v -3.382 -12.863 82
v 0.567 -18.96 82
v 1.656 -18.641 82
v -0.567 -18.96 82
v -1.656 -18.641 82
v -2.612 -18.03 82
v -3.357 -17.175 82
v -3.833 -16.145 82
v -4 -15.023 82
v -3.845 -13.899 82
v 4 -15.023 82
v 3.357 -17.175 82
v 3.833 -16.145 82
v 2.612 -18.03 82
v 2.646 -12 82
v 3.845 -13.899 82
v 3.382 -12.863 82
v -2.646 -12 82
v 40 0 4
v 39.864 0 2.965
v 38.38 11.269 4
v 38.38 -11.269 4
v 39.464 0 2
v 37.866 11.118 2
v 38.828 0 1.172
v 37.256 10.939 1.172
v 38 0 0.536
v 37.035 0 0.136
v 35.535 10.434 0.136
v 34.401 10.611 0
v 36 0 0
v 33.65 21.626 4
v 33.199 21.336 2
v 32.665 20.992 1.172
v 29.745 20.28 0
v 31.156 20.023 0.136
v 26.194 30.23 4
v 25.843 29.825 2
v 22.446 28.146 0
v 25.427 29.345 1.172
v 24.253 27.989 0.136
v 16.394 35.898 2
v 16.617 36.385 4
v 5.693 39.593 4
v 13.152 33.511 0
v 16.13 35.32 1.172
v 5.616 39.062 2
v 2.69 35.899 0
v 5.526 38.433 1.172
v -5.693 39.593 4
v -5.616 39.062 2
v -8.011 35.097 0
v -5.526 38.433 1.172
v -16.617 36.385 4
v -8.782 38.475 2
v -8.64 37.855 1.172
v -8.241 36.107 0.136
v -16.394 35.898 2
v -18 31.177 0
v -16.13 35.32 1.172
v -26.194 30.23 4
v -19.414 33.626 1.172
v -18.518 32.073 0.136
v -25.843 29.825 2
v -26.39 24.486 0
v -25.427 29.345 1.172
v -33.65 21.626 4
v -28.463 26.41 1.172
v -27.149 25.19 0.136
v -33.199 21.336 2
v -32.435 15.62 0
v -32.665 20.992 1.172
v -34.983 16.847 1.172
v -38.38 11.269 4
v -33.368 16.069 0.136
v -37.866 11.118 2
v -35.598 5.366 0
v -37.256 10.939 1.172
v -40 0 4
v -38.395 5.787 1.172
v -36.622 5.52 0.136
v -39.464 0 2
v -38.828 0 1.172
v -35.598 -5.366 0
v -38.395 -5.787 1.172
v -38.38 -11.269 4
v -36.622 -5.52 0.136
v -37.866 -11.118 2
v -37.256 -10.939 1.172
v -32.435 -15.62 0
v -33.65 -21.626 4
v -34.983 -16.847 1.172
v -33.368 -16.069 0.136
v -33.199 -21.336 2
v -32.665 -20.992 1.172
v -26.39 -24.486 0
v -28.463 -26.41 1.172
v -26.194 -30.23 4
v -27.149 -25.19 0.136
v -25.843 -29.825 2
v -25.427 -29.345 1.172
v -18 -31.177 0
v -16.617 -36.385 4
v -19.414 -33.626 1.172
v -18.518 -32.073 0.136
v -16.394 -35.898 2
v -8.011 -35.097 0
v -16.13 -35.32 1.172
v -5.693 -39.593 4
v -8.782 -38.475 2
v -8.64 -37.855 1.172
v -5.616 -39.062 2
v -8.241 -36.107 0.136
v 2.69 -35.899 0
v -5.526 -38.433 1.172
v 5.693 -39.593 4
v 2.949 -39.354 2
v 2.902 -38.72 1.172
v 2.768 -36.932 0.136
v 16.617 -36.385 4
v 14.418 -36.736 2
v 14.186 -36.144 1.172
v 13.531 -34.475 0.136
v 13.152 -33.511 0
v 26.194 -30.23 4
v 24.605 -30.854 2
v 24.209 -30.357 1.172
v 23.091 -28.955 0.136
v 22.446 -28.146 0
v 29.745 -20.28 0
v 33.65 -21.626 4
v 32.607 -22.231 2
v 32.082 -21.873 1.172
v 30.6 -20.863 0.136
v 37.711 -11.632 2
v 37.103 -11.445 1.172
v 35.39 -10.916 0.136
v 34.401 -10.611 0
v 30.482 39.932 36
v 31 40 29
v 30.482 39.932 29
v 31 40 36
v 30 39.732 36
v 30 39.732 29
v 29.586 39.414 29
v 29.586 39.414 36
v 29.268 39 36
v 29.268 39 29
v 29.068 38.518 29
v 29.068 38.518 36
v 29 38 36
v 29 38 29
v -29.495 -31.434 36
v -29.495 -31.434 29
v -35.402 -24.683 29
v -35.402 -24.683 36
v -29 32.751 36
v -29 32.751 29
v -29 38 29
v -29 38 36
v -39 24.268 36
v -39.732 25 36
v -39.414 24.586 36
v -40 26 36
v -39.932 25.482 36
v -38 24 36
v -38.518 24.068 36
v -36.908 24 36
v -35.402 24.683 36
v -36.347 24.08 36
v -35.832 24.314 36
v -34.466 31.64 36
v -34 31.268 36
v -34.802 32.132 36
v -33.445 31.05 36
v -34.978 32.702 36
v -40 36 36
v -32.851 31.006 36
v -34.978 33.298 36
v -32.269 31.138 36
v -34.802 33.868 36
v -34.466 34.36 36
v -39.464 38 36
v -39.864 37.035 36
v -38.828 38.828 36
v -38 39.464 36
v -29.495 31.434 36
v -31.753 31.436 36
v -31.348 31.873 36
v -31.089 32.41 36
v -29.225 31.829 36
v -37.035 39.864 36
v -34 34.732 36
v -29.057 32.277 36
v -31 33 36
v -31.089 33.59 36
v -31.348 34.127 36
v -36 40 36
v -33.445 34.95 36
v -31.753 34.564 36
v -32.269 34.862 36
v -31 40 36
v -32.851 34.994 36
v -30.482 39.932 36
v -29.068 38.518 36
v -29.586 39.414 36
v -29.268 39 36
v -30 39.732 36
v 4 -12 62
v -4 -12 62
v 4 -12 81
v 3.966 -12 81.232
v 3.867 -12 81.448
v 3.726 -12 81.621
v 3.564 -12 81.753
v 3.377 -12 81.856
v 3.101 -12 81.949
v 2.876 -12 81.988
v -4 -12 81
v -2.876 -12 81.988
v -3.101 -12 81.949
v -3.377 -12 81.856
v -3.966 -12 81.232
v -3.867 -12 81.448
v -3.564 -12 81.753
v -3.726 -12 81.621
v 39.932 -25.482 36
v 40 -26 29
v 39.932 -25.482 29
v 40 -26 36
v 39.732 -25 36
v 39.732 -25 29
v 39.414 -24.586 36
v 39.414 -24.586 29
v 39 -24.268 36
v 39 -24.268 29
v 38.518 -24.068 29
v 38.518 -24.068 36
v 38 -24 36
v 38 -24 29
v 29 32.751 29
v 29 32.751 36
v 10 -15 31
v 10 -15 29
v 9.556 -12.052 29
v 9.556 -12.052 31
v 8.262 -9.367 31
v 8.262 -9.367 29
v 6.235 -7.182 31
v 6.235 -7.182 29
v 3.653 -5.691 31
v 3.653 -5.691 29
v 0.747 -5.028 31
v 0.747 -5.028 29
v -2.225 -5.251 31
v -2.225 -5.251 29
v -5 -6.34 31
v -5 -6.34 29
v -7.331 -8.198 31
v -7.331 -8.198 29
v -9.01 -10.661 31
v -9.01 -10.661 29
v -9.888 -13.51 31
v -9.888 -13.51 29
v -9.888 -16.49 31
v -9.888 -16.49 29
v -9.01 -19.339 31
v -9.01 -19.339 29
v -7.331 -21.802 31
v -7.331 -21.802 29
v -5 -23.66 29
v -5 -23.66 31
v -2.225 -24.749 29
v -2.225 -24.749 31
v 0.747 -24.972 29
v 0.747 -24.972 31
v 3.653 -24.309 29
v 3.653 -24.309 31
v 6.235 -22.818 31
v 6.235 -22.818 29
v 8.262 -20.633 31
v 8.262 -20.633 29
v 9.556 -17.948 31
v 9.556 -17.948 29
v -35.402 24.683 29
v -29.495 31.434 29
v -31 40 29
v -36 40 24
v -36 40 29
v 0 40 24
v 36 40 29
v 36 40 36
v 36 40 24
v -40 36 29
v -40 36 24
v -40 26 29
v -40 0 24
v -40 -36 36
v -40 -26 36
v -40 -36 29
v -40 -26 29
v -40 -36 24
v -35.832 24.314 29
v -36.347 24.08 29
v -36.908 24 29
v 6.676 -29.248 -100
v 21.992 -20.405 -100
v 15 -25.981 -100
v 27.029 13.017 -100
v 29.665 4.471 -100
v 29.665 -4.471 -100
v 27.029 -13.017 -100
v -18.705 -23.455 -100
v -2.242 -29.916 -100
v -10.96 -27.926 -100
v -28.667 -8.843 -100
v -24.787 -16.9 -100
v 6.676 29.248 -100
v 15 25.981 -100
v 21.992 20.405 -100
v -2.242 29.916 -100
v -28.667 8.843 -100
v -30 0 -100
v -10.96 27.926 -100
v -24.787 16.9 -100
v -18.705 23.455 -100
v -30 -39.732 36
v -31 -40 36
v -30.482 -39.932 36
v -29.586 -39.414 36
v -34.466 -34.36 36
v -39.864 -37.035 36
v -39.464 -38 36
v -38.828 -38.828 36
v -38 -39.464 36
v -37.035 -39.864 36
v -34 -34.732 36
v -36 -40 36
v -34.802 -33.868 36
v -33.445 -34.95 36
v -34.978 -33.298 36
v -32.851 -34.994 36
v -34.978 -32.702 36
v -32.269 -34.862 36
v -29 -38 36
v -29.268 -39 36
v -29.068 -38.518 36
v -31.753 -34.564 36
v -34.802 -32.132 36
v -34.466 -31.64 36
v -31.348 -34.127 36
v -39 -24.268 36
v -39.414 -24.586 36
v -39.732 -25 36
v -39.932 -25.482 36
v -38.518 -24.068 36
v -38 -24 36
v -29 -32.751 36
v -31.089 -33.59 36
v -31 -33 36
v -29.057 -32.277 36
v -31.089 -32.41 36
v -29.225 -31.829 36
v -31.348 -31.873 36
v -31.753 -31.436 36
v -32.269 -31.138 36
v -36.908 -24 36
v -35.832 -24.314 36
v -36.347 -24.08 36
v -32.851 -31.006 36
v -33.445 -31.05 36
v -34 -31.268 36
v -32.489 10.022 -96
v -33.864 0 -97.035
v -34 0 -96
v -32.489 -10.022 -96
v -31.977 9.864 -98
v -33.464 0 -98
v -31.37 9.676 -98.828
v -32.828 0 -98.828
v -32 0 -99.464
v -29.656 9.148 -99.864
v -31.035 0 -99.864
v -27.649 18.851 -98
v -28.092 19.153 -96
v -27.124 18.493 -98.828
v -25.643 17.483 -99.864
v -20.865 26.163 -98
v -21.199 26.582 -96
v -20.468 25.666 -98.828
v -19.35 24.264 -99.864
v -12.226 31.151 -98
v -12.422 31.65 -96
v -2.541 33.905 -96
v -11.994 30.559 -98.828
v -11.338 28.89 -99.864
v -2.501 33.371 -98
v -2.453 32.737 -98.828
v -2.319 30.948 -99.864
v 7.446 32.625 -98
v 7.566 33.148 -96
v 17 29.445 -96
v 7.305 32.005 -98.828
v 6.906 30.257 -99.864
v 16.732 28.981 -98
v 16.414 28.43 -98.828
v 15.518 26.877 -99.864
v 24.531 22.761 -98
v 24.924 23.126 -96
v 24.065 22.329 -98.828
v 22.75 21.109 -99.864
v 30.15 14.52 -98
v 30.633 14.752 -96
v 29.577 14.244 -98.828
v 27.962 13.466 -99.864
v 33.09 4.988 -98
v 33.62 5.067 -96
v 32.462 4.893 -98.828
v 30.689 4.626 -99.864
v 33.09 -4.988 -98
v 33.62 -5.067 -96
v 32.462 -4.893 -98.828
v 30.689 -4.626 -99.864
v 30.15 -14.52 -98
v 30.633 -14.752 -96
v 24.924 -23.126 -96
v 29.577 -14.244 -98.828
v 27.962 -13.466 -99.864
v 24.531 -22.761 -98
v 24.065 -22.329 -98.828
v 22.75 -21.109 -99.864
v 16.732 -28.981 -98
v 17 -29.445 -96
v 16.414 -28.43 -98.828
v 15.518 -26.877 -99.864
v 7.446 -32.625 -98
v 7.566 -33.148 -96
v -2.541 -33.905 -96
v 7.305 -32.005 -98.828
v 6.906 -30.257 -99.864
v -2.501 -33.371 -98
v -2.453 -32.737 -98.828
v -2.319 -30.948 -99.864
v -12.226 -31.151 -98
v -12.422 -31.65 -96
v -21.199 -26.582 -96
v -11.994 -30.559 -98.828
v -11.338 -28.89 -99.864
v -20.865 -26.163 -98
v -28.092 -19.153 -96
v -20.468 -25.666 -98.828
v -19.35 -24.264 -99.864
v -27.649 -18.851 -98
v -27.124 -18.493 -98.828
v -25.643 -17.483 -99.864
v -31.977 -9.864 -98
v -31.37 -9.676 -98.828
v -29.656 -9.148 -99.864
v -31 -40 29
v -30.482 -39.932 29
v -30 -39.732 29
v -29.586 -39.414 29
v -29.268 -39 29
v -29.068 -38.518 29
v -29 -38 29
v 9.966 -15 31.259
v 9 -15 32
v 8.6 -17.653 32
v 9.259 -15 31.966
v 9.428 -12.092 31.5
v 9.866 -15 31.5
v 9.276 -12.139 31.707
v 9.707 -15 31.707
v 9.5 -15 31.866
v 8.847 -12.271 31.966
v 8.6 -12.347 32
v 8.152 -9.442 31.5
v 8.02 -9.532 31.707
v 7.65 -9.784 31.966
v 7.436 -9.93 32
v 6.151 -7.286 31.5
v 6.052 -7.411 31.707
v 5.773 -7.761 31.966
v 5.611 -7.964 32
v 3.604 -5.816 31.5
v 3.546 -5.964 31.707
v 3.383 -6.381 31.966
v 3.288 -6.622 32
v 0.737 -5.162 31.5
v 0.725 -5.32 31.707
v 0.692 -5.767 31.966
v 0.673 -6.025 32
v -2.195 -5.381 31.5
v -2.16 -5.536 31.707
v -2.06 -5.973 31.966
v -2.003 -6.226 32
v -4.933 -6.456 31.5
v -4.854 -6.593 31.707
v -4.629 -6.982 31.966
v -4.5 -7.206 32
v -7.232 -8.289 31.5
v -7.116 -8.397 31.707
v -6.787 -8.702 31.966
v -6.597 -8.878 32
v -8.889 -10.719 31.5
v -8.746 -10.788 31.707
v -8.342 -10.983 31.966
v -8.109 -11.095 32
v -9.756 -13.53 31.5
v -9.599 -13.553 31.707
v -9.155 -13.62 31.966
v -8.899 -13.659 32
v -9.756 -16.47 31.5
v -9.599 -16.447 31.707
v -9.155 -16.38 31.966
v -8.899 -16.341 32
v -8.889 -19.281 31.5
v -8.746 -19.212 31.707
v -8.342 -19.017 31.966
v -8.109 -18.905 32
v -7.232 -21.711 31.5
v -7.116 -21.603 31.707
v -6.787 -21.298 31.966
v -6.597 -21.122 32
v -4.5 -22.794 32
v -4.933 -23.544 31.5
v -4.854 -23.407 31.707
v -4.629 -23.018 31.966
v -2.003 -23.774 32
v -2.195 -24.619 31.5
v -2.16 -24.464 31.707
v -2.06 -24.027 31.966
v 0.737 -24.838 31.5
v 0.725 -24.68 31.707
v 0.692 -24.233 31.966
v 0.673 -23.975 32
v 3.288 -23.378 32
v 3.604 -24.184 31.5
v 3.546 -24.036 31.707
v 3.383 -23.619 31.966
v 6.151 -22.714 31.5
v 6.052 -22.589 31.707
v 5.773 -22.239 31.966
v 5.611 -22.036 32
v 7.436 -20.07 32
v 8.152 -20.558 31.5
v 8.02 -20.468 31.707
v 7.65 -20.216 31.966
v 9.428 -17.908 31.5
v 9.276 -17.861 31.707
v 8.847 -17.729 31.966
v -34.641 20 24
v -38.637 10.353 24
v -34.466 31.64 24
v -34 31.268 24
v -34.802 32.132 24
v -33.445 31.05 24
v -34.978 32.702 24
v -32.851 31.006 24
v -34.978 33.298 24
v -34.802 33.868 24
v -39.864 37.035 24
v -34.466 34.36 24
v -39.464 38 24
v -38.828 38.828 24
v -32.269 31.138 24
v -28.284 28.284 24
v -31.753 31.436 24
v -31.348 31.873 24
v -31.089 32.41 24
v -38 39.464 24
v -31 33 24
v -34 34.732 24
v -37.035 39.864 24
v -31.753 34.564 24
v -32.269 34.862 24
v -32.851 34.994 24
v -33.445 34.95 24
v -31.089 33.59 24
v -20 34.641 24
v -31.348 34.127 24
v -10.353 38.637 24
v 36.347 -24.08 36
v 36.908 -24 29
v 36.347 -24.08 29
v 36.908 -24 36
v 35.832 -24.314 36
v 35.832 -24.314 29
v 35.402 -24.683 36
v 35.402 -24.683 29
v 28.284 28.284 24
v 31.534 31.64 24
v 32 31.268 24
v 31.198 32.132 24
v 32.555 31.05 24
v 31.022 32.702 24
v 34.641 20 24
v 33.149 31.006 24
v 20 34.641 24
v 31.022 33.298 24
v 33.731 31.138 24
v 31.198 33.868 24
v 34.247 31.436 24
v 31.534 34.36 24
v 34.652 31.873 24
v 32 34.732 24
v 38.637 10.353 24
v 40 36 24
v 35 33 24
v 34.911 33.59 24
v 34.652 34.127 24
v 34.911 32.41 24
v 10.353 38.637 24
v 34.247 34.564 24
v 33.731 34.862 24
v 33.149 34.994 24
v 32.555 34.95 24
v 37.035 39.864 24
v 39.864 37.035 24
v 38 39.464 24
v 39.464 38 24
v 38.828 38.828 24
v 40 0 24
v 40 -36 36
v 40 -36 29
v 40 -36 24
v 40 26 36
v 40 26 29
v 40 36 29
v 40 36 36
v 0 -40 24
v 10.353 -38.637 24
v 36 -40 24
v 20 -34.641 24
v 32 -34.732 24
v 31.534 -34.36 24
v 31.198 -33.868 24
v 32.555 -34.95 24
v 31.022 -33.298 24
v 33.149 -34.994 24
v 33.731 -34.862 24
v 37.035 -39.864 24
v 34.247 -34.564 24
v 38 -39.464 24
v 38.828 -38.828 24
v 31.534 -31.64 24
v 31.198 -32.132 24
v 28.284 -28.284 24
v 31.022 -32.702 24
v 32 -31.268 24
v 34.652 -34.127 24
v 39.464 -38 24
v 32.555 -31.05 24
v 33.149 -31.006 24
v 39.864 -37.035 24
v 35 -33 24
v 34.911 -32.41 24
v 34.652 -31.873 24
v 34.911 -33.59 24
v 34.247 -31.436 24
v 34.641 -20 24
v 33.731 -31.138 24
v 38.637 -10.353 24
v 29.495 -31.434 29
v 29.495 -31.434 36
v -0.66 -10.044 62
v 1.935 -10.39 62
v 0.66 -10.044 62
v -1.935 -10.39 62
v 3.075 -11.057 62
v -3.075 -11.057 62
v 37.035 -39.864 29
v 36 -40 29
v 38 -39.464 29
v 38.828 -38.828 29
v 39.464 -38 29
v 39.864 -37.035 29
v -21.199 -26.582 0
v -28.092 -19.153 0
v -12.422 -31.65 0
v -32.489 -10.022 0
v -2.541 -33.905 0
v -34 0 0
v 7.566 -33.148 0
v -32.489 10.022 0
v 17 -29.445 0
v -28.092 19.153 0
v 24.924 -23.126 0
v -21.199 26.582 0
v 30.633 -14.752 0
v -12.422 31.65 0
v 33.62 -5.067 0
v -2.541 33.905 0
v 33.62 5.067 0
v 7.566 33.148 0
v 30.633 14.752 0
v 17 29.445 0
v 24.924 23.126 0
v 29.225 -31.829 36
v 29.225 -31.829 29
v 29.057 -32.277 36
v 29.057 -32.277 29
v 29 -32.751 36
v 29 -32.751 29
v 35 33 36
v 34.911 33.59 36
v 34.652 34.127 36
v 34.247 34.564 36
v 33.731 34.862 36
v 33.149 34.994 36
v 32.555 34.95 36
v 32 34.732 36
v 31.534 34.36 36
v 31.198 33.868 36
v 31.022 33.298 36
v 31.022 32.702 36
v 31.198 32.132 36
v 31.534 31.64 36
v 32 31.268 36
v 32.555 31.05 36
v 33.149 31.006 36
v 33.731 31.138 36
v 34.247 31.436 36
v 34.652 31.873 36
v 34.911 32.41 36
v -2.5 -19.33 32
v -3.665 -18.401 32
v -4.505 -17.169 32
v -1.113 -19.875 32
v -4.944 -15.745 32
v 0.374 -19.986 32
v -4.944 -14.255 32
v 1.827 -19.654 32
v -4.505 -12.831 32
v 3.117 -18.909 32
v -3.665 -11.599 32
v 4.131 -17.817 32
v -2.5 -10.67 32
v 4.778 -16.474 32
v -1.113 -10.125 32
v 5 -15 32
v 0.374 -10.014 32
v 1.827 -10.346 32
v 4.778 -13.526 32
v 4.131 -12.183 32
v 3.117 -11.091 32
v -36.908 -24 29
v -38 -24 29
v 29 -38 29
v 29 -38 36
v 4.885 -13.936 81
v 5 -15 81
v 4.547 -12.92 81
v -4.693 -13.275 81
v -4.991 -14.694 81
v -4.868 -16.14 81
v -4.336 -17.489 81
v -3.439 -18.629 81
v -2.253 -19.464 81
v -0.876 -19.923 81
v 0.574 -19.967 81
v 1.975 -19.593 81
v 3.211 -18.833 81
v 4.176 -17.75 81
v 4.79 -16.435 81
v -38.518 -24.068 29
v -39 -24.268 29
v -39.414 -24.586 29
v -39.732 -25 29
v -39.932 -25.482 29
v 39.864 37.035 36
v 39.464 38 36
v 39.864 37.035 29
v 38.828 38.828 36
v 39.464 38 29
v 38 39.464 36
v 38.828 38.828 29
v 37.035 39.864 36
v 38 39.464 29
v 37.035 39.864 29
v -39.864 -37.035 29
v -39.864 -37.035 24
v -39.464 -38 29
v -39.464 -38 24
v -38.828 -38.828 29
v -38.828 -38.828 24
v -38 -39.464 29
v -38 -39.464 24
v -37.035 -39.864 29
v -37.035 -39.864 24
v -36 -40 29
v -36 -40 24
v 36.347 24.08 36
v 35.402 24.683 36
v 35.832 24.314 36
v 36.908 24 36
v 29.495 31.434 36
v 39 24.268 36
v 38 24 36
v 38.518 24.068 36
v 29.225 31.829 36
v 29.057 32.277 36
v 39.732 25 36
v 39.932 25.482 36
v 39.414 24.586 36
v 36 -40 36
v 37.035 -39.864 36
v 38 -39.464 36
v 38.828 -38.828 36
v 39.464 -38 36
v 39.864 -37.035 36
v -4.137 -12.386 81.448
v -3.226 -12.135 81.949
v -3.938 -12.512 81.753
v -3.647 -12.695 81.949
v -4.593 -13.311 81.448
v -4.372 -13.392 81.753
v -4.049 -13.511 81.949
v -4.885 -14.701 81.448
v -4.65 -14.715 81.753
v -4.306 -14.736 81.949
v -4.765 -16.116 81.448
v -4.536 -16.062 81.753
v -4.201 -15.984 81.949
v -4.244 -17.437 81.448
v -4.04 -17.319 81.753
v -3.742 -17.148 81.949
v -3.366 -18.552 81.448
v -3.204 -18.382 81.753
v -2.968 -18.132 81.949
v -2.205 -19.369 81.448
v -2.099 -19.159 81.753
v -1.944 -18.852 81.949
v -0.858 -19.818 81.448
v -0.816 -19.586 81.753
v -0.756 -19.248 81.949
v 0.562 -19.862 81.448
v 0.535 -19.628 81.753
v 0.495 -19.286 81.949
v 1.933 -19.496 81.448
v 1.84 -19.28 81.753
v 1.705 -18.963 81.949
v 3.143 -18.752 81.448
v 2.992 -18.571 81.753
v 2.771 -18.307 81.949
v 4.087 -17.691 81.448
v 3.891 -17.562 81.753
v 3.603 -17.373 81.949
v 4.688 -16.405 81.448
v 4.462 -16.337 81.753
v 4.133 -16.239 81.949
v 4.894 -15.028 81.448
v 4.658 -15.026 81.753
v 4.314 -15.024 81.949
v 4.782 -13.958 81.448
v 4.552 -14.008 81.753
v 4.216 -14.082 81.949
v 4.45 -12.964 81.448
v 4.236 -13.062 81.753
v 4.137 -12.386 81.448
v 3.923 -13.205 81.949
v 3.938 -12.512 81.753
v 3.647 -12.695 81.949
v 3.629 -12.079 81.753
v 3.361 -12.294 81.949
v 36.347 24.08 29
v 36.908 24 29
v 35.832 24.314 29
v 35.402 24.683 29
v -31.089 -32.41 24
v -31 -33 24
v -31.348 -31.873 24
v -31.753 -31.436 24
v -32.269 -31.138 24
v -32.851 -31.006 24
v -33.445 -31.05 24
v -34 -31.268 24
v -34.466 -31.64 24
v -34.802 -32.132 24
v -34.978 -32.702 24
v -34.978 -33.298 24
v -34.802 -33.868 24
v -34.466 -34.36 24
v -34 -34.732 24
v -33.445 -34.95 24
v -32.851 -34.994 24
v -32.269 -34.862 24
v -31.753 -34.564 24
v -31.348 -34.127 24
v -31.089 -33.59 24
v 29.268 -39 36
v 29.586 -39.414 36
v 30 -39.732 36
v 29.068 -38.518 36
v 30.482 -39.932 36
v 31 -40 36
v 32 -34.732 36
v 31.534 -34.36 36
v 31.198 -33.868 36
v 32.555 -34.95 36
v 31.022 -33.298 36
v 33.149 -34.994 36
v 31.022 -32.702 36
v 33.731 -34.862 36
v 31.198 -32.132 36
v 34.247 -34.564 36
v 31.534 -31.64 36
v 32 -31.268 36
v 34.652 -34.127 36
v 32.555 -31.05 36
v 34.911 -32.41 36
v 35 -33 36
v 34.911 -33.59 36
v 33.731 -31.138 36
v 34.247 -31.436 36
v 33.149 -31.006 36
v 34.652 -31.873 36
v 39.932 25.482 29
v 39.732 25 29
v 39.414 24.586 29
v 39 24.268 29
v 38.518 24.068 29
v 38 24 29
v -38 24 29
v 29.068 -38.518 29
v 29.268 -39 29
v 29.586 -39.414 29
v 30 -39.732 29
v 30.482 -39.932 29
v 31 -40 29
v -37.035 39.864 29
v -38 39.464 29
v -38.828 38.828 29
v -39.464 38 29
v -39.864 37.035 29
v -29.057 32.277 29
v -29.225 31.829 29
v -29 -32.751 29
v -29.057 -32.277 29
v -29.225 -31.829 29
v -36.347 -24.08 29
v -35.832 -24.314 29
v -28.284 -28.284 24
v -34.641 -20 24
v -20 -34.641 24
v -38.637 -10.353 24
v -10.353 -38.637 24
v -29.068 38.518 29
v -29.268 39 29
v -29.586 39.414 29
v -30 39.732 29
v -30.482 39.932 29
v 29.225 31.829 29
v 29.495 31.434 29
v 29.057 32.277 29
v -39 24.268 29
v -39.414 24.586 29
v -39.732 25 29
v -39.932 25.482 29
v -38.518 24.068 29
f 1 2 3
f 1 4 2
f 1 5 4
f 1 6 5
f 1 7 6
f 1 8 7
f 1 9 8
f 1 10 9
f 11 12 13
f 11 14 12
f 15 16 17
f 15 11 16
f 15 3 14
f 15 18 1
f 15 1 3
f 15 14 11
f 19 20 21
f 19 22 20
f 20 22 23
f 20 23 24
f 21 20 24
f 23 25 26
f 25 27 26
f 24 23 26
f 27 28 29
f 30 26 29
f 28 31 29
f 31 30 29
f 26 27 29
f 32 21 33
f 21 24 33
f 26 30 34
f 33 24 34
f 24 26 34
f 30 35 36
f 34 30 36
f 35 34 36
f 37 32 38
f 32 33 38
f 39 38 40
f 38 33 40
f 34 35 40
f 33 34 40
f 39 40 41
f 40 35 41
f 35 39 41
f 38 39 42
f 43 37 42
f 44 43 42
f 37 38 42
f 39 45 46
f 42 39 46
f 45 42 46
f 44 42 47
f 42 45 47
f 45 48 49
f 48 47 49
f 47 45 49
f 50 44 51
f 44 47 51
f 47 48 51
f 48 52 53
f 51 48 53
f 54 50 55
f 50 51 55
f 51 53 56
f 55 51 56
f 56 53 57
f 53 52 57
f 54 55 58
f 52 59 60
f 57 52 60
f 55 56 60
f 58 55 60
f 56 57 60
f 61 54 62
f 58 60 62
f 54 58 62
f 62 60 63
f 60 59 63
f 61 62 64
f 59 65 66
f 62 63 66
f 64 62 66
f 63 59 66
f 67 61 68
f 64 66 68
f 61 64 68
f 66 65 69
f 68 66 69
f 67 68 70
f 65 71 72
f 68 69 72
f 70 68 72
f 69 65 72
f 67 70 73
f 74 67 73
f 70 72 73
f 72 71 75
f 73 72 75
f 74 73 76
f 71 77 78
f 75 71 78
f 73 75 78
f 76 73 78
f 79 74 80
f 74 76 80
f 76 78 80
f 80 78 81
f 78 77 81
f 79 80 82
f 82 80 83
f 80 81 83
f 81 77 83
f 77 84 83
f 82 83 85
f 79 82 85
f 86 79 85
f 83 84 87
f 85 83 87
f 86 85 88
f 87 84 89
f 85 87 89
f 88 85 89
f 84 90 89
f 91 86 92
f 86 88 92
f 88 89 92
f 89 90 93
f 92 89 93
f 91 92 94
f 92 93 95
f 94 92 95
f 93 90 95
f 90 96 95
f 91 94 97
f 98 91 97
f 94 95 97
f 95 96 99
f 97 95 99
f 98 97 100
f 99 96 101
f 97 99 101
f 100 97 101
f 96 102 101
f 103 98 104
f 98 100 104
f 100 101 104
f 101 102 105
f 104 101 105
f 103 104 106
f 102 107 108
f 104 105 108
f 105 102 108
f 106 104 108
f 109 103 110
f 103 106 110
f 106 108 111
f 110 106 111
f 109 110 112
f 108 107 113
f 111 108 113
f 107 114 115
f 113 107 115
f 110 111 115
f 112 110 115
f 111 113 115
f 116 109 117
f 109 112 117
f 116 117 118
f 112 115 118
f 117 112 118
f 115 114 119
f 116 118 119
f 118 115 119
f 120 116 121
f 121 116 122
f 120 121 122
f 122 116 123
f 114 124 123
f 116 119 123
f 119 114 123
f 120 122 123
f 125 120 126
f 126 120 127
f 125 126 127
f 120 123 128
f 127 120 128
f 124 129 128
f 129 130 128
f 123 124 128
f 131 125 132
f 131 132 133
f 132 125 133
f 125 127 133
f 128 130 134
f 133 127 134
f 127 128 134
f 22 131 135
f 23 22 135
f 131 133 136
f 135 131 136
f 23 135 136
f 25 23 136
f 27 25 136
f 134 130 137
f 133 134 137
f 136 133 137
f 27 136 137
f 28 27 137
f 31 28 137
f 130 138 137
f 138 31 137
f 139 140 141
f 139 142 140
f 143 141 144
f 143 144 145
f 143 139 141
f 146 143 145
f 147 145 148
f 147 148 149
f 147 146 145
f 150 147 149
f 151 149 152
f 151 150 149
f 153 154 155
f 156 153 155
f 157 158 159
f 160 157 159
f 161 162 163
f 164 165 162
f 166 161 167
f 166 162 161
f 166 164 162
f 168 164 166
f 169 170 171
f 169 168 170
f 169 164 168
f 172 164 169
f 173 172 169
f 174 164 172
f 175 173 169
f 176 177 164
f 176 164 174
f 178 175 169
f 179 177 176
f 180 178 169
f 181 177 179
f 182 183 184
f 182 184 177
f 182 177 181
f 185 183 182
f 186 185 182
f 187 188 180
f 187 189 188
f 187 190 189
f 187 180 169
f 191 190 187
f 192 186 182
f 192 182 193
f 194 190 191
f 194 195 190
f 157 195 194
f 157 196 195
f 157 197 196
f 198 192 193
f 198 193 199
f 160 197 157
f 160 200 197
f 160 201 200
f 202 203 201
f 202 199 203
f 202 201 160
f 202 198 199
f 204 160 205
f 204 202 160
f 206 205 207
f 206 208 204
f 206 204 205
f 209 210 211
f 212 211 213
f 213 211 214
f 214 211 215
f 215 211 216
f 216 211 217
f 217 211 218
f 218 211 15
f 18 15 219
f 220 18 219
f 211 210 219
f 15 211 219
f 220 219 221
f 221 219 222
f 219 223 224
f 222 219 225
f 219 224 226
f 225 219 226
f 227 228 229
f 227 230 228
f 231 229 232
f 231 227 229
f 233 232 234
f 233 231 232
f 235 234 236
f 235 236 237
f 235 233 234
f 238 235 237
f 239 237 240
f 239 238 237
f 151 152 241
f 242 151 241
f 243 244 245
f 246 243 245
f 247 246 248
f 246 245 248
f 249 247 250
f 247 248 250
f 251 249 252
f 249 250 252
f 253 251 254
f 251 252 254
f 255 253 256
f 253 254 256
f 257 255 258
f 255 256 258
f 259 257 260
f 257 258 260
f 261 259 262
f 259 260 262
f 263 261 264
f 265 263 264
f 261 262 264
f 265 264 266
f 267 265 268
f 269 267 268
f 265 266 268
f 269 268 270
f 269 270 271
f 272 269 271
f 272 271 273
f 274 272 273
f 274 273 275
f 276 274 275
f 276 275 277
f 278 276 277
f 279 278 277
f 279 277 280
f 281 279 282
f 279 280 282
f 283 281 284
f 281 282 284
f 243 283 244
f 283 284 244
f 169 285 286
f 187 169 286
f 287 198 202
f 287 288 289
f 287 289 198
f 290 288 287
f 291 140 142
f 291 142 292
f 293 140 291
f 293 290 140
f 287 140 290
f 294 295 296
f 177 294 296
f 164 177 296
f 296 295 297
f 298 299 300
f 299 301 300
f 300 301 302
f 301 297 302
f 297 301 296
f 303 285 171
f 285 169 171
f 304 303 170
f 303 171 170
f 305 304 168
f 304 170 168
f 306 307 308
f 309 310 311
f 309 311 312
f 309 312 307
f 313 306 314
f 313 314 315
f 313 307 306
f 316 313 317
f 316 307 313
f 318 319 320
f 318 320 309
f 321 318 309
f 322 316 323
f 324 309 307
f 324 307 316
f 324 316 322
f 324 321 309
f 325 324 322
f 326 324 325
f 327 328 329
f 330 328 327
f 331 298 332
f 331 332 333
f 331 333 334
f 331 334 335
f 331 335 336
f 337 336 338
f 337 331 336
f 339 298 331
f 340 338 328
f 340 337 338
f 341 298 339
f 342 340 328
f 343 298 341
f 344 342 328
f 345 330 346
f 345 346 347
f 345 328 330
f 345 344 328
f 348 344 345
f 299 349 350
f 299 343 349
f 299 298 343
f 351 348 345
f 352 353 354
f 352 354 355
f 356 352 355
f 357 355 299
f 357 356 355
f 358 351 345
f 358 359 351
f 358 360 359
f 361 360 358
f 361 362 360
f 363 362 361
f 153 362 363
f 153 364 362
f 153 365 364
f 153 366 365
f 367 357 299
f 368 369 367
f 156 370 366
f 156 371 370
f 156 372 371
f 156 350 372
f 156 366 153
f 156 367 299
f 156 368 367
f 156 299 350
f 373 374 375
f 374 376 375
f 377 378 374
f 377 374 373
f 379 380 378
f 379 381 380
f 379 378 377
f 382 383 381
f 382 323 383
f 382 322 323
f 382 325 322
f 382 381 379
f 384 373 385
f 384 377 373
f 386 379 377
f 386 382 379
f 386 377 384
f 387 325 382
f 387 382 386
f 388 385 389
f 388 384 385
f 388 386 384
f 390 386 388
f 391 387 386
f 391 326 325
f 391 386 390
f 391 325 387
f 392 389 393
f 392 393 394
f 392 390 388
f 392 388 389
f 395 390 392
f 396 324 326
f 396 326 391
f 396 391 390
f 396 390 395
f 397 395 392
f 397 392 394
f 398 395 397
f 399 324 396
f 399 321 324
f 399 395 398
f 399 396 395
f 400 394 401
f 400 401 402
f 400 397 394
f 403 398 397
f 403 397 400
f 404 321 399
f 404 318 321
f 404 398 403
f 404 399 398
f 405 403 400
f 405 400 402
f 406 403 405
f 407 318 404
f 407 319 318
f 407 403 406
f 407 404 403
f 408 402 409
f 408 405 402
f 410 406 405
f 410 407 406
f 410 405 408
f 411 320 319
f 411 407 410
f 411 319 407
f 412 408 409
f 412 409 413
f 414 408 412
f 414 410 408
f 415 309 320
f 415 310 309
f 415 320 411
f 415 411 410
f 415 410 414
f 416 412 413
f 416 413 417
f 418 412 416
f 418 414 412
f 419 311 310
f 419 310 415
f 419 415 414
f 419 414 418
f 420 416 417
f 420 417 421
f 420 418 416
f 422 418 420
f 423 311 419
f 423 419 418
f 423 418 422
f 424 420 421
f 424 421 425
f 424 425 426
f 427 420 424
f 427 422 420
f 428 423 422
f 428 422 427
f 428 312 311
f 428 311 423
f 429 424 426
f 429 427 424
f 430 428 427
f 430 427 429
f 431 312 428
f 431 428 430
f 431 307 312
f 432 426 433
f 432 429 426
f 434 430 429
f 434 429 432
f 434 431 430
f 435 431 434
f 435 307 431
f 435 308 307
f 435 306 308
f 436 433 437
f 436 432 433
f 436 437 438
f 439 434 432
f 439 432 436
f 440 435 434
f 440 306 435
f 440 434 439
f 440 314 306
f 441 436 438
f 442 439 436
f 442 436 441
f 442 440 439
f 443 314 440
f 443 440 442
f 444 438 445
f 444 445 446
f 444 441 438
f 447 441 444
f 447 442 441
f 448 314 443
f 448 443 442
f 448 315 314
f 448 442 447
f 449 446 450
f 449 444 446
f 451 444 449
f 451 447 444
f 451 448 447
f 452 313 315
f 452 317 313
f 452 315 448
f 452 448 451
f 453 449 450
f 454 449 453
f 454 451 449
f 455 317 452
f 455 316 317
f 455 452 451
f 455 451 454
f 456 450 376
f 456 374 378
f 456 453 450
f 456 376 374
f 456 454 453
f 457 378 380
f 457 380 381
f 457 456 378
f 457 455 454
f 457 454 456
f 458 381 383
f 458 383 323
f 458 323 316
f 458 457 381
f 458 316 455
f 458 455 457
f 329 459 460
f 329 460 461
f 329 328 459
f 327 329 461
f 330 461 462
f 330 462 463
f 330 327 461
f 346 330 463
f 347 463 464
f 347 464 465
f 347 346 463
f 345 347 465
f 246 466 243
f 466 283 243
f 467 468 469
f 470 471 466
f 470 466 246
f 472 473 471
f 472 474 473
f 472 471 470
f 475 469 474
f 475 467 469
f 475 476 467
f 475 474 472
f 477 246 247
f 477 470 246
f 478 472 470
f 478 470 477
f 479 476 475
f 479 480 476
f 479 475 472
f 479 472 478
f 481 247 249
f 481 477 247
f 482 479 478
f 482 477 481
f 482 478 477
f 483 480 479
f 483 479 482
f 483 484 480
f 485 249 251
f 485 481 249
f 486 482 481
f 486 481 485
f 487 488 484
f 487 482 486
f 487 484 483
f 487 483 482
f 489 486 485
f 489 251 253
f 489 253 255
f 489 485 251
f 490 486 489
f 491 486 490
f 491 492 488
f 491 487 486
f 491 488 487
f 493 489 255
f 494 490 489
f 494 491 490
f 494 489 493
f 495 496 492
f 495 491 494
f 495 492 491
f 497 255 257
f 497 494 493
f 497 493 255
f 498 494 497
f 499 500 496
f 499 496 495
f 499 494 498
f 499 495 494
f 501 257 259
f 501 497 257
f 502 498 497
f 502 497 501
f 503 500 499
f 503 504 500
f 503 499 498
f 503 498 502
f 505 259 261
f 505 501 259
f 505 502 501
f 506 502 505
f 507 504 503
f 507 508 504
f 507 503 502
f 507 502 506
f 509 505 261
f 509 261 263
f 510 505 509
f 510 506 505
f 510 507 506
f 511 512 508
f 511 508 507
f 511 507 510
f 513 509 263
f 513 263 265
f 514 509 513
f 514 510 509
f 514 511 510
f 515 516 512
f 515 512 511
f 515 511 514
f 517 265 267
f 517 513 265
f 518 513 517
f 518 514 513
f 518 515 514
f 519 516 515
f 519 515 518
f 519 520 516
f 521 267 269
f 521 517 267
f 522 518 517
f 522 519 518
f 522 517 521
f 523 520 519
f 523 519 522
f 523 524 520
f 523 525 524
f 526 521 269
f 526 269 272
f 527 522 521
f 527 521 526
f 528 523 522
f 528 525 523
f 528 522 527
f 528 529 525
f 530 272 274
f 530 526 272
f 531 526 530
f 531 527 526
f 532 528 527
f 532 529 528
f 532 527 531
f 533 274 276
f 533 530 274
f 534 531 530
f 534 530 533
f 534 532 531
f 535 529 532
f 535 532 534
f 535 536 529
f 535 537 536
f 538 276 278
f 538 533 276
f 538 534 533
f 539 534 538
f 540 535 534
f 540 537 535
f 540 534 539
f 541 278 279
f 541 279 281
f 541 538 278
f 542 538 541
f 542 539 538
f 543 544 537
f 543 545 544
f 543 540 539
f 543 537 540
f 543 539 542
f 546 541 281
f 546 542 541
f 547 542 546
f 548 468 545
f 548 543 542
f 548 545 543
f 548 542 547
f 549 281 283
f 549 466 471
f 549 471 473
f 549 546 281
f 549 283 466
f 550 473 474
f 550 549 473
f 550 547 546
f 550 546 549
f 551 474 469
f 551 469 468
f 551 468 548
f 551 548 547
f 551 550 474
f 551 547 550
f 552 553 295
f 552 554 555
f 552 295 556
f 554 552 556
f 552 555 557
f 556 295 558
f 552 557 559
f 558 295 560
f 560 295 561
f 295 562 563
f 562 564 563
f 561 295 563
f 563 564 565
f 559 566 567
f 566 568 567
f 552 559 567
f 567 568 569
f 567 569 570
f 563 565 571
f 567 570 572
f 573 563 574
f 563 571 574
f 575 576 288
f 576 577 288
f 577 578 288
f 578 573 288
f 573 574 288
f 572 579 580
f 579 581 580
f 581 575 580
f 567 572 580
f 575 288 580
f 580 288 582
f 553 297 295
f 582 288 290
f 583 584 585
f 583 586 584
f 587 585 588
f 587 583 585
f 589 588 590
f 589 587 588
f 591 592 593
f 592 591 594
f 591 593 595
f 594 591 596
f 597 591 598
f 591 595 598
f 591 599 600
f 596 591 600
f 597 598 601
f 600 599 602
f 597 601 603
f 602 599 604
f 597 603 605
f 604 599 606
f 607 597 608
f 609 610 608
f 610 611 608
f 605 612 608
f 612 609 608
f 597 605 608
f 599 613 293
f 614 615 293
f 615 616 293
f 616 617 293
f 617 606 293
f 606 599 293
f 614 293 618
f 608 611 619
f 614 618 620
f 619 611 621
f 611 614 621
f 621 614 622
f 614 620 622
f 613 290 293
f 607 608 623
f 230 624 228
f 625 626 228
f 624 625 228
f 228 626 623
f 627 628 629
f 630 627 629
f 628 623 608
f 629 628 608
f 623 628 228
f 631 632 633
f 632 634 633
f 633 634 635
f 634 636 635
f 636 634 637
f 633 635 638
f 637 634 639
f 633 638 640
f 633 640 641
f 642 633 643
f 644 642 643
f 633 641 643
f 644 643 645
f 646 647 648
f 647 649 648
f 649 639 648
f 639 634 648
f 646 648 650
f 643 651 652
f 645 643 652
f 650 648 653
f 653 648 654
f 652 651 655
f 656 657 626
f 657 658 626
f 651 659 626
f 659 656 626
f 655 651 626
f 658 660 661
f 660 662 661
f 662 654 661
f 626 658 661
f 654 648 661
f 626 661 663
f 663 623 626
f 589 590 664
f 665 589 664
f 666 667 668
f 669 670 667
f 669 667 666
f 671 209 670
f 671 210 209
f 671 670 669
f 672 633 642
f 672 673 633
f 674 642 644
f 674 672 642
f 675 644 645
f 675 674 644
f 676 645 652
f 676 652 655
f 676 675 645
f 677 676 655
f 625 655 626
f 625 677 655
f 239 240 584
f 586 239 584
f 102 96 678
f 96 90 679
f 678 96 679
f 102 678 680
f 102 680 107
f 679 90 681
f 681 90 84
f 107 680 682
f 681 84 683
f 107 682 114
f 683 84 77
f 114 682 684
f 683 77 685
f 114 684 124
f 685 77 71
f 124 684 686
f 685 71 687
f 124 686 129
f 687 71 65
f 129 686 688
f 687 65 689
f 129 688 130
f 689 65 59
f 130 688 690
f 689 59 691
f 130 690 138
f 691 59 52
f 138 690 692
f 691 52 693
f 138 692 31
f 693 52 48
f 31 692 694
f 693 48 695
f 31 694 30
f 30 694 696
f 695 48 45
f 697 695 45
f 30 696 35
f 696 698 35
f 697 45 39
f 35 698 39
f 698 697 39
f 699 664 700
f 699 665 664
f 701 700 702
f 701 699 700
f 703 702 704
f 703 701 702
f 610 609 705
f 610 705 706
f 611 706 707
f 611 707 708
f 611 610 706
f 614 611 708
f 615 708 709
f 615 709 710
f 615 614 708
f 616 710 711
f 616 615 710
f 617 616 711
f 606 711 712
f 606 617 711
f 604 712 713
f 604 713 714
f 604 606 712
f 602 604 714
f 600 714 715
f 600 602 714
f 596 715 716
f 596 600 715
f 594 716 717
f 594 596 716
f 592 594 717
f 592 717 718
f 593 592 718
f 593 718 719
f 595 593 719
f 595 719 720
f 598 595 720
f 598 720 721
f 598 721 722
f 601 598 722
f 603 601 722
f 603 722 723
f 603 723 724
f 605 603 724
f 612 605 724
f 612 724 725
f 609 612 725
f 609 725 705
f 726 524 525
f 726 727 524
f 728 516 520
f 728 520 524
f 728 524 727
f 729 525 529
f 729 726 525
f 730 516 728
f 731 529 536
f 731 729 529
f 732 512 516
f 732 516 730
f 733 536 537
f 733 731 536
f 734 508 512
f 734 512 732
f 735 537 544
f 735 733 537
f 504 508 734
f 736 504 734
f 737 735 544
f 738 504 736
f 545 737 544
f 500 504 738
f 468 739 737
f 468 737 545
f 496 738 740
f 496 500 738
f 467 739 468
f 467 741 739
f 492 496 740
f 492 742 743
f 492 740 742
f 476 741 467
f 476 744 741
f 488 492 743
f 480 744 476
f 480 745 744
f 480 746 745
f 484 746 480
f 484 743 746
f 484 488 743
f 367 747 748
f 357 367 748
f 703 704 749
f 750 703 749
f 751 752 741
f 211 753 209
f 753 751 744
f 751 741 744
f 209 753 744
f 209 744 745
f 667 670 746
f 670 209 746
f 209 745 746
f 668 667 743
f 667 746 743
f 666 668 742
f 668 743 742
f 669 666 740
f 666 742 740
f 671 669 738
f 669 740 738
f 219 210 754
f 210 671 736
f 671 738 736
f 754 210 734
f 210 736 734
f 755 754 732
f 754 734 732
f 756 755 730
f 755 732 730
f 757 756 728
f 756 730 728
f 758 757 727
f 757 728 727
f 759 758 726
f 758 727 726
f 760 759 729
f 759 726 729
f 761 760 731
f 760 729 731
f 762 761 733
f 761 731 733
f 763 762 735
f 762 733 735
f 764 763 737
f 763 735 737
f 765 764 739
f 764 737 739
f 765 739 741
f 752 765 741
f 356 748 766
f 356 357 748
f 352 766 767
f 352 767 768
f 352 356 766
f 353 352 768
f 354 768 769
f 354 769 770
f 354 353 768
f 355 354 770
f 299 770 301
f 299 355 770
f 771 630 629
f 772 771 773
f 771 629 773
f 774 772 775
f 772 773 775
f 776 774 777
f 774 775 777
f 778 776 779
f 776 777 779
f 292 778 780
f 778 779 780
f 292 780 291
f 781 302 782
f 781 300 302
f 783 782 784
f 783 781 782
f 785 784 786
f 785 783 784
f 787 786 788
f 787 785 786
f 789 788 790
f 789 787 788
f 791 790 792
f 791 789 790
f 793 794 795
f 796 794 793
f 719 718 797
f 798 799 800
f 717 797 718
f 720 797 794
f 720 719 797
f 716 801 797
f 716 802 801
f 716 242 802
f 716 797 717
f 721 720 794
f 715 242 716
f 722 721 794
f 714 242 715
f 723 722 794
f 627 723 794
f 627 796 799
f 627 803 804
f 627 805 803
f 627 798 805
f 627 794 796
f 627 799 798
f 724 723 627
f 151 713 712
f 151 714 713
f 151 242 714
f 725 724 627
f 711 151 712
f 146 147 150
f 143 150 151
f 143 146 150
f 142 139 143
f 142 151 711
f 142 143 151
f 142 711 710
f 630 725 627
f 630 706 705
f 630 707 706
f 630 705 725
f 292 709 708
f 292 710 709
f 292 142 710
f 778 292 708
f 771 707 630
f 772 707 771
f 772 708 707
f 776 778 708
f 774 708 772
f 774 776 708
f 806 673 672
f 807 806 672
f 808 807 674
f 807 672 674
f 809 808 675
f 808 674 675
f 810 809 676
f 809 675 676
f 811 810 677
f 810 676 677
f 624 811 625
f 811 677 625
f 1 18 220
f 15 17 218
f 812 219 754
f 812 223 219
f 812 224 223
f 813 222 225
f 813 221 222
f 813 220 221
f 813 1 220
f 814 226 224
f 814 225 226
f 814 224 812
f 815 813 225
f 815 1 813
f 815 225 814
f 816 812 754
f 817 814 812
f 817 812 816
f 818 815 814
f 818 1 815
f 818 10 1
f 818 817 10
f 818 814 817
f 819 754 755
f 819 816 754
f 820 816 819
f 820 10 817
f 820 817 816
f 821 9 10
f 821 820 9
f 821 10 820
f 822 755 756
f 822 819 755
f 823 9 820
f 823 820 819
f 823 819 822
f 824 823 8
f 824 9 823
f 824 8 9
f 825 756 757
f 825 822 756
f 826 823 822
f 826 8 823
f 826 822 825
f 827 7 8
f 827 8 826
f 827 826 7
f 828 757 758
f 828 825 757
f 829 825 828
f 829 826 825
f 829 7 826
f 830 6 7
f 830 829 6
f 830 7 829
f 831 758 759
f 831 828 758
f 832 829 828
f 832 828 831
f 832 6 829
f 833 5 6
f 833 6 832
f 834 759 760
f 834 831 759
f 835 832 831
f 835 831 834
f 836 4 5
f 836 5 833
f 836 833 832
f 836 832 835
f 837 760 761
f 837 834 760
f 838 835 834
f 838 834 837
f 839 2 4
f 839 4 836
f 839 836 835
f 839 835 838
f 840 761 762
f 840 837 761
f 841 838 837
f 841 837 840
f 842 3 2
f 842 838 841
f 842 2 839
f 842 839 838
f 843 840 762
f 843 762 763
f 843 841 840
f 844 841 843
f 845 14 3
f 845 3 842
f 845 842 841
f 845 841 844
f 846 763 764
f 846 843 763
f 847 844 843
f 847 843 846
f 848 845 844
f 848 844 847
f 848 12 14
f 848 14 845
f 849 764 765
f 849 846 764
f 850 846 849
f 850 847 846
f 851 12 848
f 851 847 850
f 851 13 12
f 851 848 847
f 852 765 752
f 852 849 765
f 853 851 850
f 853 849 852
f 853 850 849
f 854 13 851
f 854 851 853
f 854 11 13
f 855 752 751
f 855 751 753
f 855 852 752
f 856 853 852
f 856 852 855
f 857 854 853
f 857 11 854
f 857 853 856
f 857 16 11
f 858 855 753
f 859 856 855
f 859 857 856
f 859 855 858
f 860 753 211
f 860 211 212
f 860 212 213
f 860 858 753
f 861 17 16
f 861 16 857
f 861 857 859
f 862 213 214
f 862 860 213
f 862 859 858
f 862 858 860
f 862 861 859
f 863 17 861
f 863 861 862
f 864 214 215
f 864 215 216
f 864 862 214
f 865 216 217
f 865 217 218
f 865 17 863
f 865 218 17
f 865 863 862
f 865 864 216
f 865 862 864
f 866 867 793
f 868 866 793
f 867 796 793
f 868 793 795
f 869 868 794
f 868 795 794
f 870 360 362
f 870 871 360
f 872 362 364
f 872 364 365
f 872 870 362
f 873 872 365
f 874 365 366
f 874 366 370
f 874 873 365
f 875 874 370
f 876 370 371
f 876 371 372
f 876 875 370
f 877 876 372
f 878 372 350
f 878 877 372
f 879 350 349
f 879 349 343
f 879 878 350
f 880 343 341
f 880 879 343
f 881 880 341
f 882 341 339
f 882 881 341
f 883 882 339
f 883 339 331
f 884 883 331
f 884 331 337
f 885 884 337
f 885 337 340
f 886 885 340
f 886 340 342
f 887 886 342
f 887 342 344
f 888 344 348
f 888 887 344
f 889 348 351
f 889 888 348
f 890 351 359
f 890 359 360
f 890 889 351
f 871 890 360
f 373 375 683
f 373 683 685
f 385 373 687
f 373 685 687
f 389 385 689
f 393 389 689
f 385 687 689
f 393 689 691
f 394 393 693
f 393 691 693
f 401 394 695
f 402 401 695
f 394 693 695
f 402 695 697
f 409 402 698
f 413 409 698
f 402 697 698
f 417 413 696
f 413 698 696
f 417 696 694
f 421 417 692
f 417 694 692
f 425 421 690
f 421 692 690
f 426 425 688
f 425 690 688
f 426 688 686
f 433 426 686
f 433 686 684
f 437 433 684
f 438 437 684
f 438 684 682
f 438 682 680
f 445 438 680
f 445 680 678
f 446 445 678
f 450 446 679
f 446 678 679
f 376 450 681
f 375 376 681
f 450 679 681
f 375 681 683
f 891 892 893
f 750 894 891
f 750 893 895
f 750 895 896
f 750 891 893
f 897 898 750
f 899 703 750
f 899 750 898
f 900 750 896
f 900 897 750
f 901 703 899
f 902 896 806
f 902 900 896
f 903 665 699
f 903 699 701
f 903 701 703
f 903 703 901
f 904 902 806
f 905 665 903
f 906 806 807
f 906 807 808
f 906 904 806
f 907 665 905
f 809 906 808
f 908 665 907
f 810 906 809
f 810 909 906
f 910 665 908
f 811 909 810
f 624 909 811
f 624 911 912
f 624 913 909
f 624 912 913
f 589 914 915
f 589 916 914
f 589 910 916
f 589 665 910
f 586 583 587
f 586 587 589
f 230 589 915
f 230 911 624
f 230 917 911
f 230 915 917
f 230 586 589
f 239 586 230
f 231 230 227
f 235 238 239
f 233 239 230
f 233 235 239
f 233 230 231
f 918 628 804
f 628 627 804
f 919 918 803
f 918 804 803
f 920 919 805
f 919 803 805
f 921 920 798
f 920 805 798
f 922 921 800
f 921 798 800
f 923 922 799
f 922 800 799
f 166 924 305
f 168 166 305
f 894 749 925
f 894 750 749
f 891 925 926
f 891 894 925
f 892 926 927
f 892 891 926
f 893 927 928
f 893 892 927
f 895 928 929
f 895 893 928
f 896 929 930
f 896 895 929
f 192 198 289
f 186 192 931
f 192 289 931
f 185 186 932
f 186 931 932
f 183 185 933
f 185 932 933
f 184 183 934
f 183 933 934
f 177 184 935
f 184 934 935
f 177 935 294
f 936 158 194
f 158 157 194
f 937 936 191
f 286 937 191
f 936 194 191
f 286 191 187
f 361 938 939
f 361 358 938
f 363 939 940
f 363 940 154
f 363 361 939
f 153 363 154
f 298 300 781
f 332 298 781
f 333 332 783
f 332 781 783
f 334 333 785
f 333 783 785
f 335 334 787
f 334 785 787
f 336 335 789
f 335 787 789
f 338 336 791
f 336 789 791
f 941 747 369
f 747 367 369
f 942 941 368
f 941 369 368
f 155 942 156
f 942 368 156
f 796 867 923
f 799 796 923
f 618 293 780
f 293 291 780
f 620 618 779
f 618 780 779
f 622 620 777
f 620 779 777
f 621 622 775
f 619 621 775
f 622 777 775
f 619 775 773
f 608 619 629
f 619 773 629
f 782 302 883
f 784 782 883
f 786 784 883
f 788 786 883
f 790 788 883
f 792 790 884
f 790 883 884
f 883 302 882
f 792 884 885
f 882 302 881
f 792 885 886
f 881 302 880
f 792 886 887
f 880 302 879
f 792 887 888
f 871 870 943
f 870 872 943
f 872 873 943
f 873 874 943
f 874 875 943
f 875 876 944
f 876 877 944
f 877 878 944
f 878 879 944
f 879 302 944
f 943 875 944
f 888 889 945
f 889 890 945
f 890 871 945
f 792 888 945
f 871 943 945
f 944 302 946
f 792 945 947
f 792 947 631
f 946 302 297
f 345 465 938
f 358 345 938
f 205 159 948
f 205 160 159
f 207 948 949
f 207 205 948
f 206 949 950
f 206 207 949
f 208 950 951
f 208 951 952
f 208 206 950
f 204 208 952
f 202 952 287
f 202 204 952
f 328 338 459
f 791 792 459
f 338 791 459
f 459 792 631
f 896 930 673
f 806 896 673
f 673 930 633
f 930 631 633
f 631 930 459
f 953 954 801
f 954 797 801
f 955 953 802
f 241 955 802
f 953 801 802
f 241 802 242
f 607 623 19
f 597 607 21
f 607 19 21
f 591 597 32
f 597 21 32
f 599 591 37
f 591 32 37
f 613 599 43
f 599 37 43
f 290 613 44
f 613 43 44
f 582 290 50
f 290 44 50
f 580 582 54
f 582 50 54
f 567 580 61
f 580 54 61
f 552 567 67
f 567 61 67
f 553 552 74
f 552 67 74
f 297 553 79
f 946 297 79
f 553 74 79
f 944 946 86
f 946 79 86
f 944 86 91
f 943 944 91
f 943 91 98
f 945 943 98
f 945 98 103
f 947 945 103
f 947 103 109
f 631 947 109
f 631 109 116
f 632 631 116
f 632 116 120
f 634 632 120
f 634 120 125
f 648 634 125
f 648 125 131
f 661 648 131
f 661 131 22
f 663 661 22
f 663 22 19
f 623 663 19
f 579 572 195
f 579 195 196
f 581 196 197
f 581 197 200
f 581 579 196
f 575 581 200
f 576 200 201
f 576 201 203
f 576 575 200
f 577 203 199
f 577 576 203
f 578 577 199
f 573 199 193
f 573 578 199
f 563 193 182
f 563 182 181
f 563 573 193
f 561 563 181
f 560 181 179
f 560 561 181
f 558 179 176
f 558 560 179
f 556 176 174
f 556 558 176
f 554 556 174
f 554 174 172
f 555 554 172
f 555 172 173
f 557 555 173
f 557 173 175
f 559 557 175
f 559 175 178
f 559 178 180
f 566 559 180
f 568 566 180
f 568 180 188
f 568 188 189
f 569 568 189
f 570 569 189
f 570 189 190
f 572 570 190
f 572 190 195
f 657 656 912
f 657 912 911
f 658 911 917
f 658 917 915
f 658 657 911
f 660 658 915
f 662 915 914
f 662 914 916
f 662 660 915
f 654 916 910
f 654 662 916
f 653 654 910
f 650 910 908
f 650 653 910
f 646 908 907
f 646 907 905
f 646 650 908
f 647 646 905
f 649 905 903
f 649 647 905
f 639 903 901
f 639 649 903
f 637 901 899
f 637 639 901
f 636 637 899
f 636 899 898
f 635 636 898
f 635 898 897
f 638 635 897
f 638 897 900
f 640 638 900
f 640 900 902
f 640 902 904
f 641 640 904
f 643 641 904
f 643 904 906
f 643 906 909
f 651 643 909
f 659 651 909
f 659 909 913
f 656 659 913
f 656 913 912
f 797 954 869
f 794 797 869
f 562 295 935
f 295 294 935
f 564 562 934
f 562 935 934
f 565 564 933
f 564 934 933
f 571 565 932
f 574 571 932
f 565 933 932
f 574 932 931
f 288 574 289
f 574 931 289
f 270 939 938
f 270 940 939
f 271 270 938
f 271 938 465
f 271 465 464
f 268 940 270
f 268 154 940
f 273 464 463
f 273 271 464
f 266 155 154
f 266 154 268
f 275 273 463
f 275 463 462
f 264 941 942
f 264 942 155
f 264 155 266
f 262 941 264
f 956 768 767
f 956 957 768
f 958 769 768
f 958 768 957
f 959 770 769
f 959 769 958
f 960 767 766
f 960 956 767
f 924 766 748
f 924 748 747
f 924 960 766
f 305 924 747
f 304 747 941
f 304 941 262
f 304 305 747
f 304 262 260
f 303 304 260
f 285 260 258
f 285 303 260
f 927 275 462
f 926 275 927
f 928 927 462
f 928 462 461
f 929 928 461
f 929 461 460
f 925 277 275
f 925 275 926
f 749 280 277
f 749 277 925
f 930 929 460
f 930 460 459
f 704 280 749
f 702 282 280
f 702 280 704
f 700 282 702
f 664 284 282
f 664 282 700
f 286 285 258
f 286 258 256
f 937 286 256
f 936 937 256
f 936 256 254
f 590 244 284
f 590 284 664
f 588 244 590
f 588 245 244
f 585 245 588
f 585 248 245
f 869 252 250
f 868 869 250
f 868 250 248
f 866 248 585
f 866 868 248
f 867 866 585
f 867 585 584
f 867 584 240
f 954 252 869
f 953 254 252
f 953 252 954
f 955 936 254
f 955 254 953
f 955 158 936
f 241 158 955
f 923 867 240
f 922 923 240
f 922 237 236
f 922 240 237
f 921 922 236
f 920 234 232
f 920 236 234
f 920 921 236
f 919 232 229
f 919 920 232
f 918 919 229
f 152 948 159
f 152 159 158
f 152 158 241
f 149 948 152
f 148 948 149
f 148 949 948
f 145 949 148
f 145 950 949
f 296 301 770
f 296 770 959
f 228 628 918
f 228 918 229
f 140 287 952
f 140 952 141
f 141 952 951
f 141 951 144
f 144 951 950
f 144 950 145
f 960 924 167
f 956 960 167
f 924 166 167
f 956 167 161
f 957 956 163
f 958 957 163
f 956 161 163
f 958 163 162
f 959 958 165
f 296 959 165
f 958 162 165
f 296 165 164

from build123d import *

# Parameters (mm, degrees)
SKETCH1_R               = 40
BOSS_EXTRUDE1_DEPTH     = 24
SKETCH2_W               = 80
SKETCH2_H               = 80
SKETCH2_R               = 2
BOSS_EXTRUDE2_DEPTH     = 5
FILLET1_R               = 4
SKETCH3_R               = 34
BOSS_EXTRUDE3_DEPTH     = 100
FILLET2_R               = 4
SKETCH4_R               = 10
BOSS_EXTRUDE4_DEPTH     = 3
SKETCH5_R               = 5
BOSS_EXTRUDE5_DEPTH     = 50
FILLET3_R               = 1
FILLET4_R               = 1
SKETCH6_W               = 26.979088542
SKETCH6_H               = 2
CUT_EXTRUDE1_DEPTH      = 1
CUT_EXTRUDE1_DEPTH_BACK = 81
SKETCH8_R               = 2
BOSS_EXTRUDE6_DEPTH     = 7
FILLET5_R               = 2


with BuildPart() as part:
    # Sketch1 → Boss-Extrude1 (new body)
    with BuildSketch(Plane.XY):
        Circle(SKETCH1_R)
    extrude(amount=BOSS_EXTRUDE1_DEPTH)

    # Sketch2 → Boss-Extrude2 (add)
    with BuildSketch(Plane.XY.offset(24)):
        Rectangle(SKETCH2_W, SKETCH2_H)
        with Locations((33, -33)):
            Circle(SKETCH2_R, mode=Mode.SUBTRACT)
        with Locations((-33, 33)):
            Circle(SKETCH2_R, mode=Mode.SUBTRACT)
        with Locations((33, 33)):
            Circle(SKETCH2_R, mode=Mode.SUBTRACT)
        with Locations((-33, -33)):
            Circle(SKETCH2_R, mode=Mode.SUBTRACT)
    extrude(amount=BOSS_EXTRUDE2_DEPTH)

    # Fillet1
    fillet1_edges = [part.edges().sort_by_distance(p)[0] for p in [
        (40, 40, 26.5),
        (-40, 40, 26.5),
        (-40, -40, 26.5),
        (40, -40, 26.5),
    ]]
    fillet(fillet1_edges, radius=FILLET1_R)

    # Sketch3 → Boss-Extrude3 (add)
    with BuildSketch(Plane(origin=(0, 0, 0), x_dir=(-1, 0, 0), z_dir=(0, 0, -1))):
        Circle(SKETCH3_R)
    extrude(amount=BOSS_EXTRUDE3_DEPTH)

    # Fillet2
    fillet2_edges = [part.edges().sort_by_distance(p)[0] for p in [
        (-40, 0, 0),
        (34, 0, -100),
    ]]
    fillet(fillet2_edges, radius=FILLET2_R)

    # Sketch4 → Boss-Extrude4 (add)
    with BuildSketch(Plane.XY.offset(29)):
        with Locations((0, -15)):
            Circle(SKETCH4_R)
    extrude(amount=BOSS_EXTRUDE4_DEPTH)

    # Sketch5 → Boss-Extrude5 (add)
    with BuildSketch(Plane.XY.offset(32)):
        with Locations((0, -15)):
            Circle(SKETCH5_R)
    extrude(amount=BOSS_EXTRUDE5_DEPTH)

    # Fillet3
    fillet3_edges = [part.edges().sort_by_distance(p)[0] for p in [
        (-10, -15, 32),
    ]]
    fillet(fillet3_edges, radius=FILLET3_R)

    # Fillet4
    fillet4_edges = [part.edges().sort_by_distance(p)[0] for p in [
        (-5, -15, 82),
    ]]
    fillet(fillet4_edges, radius=FILLET4_R)

    # Sketch6 → Cut-Extrude1 (cut, two sides)
    with BuildSketch(Plane.ZY.offset(40)) as cut_extrude1_sk:
        with Locations((75.489544271, -11)):
            Rectangle(SKETCH6_W, SKETCH6_H)
    extrude(amount=CUT_EXTRUDE1_DEPTH, mode=Mode.SUBTRACT)
    extrude(cut_extrude1_sk.sketch, amount=-CUT_EXTRUDE1_DEPTH_BACK, mode=Mode.SUBTRACT)

    # Sketch8 → Boss-Extrude6 (add)
    with BuildSketch(Plane.XY.offset(29)):
        with BuildLine():
            Line((-36, -24), (-40, -24))
            Line((-40, -24), (-40, -36))
            ThreePointArc((-40, -36), (-38.828427125, -38.828427125), (-36, -40))
            Line((-36, -40), (-29, -40))
            Line((-29, -40), (-29, -32))
            Line((-29, -32), (-36, -24))
        make_face()
        with Locations((-33, -33)):
            Circle(SKETCH8_R, mode=Mode.SUBTRACT)
        with BuildLine():
            Line((29, -32), (29, -40))
            Line((29, -40), (36, -40))
            ThreePointArc((36, -40), (38.828427125, -38.828427125), (40, -36))
            Line((40, -36), (40, -24))
            Line((40, -24), (36, -24))
            Line((36, -24), (29, -32))
        make_face()
        with Locations((33, -33)):
            Circle(SKETCH8_R, mode=Mode.SUBTRACT)
        with BuildLine():
            Line((-40, 36), (-40, 24))
            Line((-40, 24), (-36, 24))
            Line((-36, 24), (-29, 32))
            Line((-29, 32), (-29, 40))
            Line((-29, 40), (-36, 40))
            ThreePointArc((-36, 40), (-38.828427125, 38.828427125), (-40, 36))
        make_face()
        with Locations((-33, 33)):
            Circle(SKETCH8_R, mode=Mode.SUBTRACT)
        with BuildLine():
            Line((36, 40), (29, 40))
            Line((29, 40), (29, 32))
            Line((29, 32), (36, 24))
            Line((36, 24), (40, 24))
            Line((40, 24), (40, 36))
            ThreePointArc((40, 36), (38.828427125, 38.828427125), (36, 40))
        make_face()
        with Locations((33, 33)):
            Circle(SKETCH8_R, mode=Mode.SUBTRACT)
    extrude(amount=BOSS_EXTRUDE6_DEPTH)

    # Fillet5
    fillet5_edges = [part.edges().sort_by_distance(p)[0] for p in [
        (-36, -24, 32.5),
        (-40, -24, 32.5),
        (-29, -40, 32.5),
        (-29, -32, 32.5),
        (36, -24, 32.5),
        (29, -32, 32.5),
        (29, -40, 32.5),
        (40, -24, 32.5),
        (-36, 24, 32.5),
        (-29, 32, 32.5),
        (-29, 40, 32.5),
        (-40, 24, 32.5),
        (36, 24, 32.5),
        (40, 24, 32.5),
        (29, 40, 32.5),
        (29, 32, 32.5),
    ]]
    fillet(fillet5_edges, radius=FILLET5_R)


solid = part.part
